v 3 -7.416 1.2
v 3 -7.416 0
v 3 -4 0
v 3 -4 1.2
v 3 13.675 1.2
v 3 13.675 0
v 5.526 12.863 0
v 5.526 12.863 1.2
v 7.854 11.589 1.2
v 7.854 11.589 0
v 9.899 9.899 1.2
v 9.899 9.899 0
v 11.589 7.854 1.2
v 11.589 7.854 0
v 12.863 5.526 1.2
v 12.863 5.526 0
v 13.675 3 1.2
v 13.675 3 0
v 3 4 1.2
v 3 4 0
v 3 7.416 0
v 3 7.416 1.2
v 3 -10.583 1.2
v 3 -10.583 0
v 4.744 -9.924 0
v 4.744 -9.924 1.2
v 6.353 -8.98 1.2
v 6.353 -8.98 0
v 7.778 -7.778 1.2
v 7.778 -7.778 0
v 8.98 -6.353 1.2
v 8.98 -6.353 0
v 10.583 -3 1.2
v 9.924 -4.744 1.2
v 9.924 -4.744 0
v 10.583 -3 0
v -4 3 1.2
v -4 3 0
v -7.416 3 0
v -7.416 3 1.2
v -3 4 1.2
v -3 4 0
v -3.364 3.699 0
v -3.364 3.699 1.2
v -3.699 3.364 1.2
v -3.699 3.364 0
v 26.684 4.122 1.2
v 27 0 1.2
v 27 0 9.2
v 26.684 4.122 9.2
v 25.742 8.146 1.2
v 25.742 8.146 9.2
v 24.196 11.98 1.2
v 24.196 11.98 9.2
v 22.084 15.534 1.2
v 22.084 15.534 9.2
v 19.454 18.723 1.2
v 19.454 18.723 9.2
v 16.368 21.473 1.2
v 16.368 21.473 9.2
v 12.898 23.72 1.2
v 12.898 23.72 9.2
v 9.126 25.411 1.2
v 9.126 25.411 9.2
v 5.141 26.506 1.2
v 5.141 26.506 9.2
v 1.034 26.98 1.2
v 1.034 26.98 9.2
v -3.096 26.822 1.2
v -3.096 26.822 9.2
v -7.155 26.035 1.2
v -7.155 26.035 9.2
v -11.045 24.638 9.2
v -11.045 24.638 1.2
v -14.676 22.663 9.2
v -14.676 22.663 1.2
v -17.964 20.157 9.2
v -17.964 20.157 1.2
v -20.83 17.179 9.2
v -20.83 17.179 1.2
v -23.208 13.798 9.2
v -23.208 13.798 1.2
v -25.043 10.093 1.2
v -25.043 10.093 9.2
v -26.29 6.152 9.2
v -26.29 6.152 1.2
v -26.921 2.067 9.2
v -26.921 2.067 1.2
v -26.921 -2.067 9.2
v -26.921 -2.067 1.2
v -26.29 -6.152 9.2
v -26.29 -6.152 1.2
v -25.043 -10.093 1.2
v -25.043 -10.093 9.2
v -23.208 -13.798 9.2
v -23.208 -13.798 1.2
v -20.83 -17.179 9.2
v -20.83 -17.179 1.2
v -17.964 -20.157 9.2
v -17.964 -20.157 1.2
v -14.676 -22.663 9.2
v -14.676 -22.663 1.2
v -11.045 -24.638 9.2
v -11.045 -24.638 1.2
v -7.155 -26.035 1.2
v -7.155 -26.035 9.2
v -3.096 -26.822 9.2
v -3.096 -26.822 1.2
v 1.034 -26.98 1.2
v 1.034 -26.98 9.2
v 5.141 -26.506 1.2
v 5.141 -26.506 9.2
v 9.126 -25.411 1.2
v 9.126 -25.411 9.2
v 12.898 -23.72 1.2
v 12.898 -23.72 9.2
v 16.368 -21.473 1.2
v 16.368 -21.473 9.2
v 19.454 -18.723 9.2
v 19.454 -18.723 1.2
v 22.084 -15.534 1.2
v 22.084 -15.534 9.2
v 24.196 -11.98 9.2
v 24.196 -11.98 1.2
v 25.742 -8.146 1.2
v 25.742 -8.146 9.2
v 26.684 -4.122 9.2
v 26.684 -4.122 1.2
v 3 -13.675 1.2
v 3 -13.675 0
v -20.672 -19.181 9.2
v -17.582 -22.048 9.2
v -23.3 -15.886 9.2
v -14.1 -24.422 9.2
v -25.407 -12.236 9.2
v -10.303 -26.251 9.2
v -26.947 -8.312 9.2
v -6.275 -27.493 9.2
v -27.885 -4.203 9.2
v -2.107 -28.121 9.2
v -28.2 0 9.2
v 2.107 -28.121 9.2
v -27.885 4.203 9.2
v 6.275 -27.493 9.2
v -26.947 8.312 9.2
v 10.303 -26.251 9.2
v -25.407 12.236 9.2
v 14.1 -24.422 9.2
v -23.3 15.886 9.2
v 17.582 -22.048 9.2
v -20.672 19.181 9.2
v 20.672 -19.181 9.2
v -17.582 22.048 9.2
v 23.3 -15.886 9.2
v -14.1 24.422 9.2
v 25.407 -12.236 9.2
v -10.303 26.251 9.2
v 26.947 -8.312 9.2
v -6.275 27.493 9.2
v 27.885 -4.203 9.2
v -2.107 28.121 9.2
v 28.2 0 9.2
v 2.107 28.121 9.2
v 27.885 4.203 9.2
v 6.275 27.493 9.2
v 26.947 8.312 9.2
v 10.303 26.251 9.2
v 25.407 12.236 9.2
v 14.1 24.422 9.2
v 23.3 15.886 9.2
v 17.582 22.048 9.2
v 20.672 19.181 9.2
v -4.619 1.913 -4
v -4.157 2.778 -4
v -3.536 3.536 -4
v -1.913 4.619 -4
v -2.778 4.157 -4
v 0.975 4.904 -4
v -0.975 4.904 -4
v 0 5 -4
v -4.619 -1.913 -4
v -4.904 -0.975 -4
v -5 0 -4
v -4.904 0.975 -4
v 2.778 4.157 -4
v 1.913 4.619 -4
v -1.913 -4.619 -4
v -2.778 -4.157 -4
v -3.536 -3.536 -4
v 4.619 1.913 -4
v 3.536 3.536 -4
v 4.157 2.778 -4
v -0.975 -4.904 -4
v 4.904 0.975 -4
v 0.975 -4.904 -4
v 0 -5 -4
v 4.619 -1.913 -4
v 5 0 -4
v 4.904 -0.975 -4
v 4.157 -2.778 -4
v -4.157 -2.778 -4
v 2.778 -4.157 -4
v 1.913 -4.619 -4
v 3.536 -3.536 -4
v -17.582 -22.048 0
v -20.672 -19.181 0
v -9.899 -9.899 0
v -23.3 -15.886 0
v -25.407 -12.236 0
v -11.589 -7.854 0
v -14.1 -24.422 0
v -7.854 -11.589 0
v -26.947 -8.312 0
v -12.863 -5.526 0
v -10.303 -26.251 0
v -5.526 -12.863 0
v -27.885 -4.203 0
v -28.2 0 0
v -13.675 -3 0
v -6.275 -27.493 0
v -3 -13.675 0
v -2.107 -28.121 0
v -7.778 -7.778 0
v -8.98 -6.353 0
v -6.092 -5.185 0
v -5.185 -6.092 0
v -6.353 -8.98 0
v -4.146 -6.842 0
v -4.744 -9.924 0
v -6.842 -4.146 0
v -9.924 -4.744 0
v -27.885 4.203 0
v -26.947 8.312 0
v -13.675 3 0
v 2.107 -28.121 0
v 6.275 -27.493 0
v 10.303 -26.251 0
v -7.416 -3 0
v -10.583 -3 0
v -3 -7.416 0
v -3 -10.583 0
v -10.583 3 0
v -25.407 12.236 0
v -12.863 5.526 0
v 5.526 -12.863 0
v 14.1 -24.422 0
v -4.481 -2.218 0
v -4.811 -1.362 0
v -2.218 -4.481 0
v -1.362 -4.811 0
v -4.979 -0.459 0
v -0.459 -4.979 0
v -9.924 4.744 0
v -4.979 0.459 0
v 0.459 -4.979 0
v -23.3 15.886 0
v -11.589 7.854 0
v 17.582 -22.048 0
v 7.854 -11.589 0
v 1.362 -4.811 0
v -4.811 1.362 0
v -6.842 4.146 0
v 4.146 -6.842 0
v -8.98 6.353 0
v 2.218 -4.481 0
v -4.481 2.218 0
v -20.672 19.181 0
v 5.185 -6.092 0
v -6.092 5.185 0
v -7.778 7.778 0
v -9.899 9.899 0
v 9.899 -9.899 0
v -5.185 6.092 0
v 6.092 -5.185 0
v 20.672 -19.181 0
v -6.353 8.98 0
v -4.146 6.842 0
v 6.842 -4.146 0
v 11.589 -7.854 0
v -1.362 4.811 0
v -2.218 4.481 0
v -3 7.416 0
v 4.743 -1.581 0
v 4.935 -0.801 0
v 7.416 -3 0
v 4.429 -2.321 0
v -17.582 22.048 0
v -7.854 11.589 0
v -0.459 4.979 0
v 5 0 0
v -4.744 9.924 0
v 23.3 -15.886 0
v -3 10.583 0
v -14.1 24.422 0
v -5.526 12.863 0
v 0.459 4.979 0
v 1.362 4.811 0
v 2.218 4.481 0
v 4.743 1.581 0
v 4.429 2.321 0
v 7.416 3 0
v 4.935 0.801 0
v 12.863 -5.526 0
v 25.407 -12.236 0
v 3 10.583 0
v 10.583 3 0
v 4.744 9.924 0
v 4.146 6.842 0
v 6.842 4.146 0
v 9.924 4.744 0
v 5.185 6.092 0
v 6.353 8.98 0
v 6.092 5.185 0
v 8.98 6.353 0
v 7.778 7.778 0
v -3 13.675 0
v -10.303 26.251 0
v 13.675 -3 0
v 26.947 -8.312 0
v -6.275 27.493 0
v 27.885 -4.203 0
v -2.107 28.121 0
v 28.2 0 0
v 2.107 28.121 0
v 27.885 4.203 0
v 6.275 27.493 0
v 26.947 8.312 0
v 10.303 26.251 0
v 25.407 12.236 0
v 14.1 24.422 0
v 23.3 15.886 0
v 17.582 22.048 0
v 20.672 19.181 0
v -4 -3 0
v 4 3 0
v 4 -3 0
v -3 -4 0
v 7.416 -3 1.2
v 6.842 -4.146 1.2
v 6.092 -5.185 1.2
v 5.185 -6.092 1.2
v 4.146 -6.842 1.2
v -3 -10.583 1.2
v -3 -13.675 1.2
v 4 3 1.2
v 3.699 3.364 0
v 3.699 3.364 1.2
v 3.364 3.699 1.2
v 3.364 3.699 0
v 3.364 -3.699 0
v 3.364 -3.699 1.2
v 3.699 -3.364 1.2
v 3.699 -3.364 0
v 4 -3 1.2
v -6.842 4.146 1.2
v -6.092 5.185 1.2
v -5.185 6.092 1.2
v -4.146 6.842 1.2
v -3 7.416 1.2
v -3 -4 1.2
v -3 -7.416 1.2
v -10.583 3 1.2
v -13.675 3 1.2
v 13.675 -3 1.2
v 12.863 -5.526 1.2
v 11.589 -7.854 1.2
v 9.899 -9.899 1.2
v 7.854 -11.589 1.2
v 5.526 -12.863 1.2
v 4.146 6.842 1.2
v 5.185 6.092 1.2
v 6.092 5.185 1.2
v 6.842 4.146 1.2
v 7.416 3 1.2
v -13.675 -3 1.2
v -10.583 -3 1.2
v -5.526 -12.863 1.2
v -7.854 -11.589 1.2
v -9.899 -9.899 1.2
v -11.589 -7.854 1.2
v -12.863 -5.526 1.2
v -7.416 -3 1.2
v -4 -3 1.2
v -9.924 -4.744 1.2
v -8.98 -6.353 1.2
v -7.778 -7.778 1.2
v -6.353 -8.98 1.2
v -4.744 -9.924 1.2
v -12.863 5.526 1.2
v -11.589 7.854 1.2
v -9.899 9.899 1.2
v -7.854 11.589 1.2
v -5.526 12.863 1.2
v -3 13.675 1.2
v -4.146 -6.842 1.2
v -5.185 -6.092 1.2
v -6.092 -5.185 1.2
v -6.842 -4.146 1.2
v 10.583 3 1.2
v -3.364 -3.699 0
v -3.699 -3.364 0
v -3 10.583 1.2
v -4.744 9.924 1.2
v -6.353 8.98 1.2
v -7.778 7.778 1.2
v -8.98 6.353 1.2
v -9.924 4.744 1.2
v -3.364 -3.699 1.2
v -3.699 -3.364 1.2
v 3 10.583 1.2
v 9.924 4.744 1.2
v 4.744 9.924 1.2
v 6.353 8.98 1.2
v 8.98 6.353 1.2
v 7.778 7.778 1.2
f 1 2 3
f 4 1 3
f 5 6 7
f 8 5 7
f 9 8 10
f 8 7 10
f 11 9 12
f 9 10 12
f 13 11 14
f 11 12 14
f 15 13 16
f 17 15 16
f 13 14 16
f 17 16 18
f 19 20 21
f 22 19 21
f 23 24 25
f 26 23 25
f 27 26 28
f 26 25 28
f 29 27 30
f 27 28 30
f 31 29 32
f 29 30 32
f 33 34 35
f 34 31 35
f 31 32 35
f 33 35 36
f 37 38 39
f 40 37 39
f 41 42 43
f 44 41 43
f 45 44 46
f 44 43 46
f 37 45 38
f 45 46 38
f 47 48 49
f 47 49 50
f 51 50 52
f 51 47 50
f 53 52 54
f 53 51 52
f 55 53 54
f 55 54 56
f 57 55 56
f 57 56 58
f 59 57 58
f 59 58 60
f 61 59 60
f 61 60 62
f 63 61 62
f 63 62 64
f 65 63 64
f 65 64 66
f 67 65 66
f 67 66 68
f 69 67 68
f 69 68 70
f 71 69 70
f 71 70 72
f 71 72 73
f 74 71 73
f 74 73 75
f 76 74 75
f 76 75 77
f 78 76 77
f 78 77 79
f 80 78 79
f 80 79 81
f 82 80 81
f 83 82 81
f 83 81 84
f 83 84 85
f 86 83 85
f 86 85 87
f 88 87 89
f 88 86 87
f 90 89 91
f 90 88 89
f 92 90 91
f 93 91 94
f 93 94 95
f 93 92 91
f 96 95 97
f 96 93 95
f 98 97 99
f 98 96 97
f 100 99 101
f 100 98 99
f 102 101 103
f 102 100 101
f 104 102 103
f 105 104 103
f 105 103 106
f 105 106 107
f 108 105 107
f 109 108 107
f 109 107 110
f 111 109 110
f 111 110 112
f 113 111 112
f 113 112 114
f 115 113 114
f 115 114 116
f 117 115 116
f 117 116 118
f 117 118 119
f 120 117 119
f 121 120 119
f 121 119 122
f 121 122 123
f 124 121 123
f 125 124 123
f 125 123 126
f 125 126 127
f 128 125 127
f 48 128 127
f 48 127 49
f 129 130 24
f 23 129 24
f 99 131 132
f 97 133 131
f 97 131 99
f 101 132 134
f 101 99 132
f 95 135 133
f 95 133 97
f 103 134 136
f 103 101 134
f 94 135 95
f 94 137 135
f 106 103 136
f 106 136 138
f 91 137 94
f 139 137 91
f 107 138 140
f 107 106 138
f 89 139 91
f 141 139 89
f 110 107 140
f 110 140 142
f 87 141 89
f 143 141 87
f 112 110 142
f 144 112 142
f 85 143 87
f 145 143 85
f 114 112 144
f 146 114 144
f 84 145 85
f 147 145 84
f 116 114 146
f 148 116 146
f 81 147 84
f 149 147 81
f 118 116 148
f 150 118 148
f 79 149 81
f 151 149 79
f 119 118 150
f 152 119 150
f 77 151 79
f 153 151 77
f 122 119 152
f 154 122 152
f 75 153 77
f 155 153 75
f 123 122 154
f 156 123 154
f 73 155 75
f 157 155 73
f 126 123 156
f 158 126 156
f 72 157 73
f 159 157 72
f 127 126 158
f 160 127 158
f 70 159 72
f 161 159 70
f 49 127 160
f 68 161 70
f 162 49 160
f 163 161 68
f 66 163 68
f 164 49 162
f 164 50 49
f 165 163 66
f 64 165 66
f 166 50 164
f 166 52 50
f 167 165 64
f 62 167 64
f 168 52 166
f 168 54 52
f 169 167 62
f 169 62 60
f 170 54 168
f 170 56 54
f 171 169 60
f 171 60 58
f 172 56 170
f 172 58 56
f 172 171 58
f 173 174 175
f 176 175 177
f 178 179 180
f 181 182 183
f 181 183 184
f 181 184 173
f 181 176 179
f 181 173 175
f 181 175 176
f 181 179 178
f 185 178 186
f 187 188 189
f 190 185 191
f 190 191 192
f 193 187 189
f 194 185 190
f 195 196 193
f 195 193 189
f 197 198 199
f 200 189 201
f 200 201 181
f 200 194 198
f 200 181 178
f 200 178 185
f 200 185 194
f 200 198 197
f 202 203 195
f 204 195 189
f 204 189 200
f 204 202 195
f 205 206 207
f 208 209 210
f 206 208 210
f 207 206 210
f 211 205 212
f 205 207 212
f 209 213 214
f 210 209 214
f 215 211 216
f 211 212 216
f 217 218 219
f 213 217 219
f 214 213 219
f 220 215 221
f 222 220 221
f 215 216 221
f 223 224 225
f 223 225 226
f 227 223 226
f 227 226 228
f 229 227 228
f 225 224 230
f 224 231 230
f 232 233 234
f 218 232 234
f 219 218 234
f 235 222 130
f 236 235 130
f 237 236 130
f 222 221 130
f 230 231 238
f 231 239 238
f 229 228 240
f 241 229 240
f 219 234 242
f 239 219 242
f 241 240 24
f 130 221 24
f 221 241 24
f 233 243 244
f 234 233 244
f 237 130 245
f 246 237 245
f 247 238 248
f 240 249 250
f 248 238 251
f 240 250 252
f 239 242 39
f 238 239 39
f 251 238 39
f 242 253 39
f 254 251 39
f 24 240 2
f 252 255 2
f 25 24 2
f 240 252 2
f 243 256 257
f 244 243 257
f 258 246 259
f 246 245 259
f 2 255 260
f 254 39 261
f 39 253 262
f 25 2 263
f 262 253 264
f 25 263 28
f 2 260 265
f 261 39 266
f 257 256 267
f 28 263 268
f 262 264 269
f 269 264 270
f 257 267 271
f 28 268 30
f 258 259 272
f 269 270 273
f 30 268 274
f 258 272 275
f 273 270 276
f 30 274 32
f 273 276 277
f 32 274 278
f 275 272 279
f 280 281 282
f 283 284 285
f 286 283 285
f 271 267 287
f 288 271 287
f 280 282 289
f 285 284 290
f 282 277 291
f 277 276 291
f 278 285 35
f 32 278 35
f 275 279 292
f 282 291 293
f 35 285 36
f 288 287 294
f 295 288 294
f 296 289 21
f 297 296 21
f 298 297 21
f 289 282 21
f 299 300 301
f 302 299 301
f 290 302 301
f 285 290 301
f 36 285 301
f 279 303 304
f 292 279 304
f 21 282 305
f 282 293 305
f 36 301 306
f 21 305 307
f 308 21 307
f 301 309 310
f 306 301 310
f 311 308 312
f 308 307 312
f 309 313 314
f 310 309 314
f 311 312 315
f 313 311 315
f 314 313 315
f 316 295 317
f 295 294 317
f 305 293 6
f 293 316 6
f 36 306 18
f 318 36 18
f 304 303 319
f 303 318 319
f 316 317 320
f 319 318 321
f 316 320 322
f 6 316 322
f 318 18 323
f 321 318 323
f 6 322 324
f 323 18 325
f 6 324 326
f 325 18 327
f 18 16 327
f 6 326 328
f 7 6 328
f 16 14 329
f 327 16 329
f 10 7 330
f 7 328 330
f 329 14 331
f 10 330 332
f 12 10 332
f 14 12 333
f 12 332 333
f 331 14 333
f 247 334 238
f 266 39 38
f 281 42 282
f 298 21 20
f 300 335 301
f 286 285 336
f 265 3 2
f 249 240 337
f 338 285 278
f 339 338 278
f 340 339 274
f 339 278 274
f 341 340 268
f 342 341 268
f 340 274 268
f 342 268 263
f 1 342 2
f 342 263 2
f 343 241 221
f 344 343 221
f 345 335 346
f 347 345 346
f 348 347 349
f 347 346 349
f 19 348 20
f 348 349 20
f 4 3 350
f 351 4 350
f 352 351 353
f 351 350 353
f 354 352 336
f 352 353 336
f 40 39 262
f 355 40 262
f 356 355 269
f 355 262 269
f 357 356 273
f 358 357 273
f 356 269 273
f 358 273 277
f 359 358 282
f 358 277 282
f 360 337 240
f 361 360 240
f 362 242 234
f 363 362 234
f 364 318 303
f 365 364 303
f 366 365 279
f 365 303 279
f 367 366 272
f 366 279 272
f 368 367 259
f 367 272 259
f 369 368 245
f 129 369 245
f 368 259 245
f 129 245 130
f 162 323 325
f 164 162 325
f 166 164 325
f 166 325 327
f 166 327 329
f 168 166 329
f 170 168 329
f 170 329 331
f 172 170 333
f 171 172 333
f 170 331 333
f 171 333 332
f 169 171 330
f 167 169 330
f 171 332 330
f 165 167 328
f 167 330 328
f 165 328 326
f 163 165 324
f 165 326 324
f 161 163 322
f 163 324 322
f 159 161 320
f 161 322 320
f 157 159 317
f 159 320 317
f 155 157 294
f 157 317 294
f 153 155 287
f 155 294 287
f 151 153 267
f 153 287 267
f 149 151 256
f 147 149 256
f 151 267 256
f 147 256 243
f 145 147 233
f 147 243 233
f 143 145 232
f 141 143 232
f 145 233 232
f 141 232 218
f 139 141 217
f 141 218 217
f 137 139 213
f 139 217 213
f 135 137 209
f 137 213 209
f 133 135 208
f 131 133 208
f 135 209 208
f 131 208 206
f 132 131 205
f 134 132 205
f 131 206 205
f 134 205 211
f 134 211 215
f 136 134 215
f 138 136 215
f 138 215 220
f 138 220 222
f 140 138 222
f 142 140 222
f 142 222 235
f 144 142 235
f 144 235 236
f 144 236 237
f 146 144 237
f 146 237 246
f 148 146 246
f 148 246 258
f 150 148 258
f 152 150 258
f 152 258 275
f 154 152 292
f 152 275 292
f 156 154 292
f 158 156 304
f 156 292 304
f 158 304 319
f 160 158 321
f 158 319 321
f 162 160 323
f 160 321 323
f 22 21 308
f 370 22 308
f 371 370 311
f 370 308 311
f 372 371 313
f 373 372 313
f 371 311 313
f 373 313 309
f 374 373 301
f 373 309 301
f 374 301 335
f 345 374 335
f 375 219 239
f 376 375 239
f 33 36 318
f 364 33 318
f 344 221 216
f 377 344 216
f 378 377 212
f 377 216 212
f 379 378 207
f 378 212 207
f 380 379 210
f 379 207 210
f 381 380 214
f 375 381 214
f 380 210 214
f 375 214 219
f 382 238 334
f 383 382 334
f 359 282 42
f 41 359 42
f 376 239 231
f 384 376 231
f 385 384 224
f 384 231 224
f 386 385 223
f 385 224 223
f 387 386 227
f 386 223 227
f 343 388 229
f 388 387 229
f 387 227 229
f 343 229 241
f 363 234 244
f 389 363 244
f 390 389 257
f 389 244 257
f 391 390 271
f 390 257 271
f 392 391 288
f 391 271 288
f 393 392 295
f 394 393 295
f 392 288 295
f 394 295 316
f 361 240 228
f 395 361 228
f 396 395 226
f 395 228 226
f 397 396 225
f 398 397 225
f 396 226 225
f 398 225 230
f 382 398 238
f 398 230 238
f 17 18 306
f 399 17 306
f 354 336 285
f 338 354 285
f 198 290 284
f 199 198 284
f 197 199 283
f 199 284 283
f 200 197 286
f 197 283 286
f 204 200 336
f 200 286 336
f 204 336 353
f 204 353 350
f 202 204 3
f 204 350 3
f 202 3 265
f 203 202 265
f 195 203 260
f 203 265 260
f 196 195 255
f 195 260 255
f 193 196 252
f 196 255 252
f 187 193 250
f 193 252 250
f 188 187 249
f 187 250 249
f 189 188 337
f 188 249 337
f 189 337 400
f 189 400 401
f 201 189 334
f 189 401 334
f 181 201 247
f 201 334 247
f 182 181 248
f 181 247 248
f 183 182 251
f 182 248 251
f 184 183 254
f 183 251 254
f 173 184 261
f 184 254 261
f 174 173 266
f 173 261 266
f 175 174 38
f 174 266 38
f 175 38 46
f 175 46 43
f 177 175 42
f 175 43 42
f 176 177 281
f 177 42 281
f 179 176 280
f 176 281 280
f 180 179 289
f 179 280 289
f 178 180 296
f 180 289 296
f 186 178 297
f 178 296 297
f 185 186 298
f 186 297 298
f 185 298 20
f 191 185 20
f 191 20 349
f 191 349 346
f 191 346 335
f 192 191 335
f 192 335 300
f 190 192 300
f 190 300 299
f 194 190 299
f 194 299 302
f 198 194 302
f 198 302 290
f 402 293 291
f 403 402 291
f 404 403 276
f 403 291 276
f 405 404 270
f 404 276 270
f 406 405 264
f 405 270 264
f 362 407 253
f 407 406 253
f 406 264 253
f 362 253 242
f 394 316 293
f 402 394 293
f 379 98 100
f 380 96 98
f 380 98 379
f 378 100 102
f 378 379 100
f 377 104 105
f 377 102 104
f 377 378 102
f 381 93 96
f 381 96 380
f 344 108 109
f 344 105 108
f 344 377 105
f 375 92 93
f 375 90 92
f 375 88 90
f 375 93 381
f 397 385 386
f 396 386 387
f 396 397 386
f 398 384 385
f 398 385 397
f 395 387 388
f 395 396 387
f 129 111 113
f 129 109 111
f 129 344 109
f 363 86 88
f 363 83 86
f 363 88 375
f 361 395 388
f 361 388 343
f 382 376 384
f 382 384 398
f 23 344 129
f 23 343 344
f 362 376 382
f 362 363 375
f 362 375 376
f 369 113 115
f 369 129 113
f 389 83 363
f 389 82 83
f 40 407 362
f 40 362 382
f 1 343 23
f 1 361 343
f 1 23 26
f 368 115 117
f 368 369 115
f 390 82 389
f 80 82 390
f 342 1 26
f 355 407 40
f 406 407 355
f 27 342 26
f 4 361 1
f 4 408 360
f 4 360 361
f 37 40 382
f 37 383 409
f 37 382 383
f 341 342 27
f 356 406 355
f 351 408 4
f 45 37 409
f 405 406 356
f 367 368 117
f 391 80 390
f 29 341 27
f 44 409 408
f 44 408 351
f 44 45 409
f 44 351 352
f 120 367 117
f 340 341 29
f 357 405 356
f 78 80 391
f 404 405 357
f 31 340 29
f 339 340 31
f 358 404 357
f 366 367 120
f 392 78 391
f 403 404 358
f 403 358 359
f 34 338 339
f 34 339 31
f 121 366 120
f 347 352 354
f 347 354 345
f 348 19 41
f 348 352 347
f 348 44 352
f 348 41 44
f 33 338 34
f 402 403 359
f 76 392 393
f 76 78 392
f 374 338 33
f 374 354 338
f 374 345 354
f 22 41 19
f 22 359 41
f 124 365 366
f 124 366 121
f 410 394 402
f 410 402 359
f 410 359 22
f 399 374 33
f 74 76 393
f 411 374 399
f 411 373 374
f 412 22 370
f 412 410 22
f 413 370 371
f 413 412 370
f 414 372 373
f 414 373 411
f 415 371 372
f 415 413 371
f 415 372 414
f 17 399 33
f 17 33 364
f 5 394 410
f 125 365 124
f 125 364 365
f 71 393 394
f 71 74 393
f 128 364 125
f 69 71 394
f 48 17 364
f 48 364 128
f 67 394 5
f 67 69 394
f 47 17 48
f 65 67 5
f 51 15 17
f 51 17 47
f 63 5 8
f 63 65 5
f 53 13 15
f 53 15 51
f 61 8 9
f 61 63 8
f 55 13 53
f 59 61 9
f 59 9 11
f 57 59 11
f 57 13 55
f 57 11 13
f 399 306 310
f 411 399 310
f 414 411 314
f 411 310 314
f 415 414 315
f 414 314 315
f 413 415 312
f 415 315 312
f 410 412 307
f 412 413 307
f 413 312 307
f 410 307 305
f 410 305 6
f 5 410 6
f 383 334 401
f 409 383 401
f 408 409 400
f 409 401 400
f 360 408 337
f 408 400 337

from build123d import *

# Parameters (mm, degrees)
F0_R     = 28.2
F1_DEPTH = 9.2
F2_T     = -1.2
F4_DEPTH = 9.201
F5_R     = 5
F6_DEPTH = 4


# Not quite as in the source:
# - after a boolean that leaves OpenCascade's solid faulty, fix() repairs it


with BuildPart() as f1:
    # F0 (on Top) → F1 (new body)
    with BuildSketch(Plane.XY):
        Circle(F0_R)
    extrude(amount=F1_DEPTH)

    # F2
    f2_openings = [f1.faces().sort_by_distance(p)[0] for p in [
        (0, 0, 9.2),
    ]]
    offset(amount=F2_T, openings=f2_openings)

    # F3 (on face) → F4 (cut, through all)
    with BuildSketch(Plane(origin=(0, 0, 0), x_dir=(1, 0, 0), z_dir=(0, 0, -1))):
        with BuildLine():
            ThreePointArc((4, -3), (3.5355339059, -3.5355339059), (3, -4))
            Line((3, -4), (3, -7.4161984871))
            ThreePointArc((3, -7.4161984871), (5.6568542495, -5.6568542495), (7.4161984871, -3))
            Line((7.4161984871, -3), (4, -3))
        make_face()
        with BuildLine():
            ThreePointArc((10.5830052443, -3), (7.7781745931, -7.7781745931), (3, -10.5830052443))
            Line((3, -10.5830052443), (3, -13.6747943312))
            ThreePointArc((3, -13.6747943312), (9.8994949366, -9.8994949366), (13.6747943312, -3))
            Line((13.6747943312, -3), (10.5830052443, -3))
        make_face()
        with BuildLine():
            ThreePointArc((-13.6747943312, -3), (-9.8994949366, -9.8994949366), (-3, -13.6747943312))
            Line((-3, -13.6747943312), (-3, -10.5830052443))
            ThreePointArc((-3, -10.5830052443), (-7.7781745931, -7.7781745931), (-10.5830052443, -3))
            Line((-10.5830052443, -3), (-13.6747943312, -3))
        make_face()
        with BuildLine():
            ThreePointArc((-4, 3), (-3.5355339059, 3.5355339059), (-3, 4))
            Line((-3, 4), (-3, 7.4161984871))
            ThreePointArc((-3, 7.4161984871), (-5.6568542495, 5.6568542495), (-7.4161984871, 3))
            Line((-7.4161984871, 3), (-4, 3))
        make_face()
        with BuildLine():
            ThreePointArc((-10.5830052443, 3), (-7.7781745931, 7.7781745931), (-3, 10.5830052443))
            Line((-3, 10.5830052443), (-3, 13.6747943312))
            ThreePointArc((-3, 13.6747943312), (-9.8994949366, 9.8994949366), (-13.6747943312, 3))
            Line((-13.6747943312, 3), (-10.5830052443, 3))
        make_face()
        with BuildLine():
            Line((10.5830052443, 3), (13.6747943312, 3))
            ThreePointArc((13.6747943312, 3), (9.8994949366, 9.8994949366), (3, 13.6747943312))
            Line((3, 13.6747943312), (3, 10.5830052443))
            ThreePointArc((3, 10.5830052443), (7.7781745931, 7.7781745931), (10.5830052443, 3))
        make_face()
        with BuildLine():
            Line((4, 3), (7.4161984871, 3))
            ThreePointArc((7.4161984871, 3), (5.6568542495, 5.6568542495), (3, 7.4161984871))
            Line((3, 7.4161984871), (3, 4))
            ThreePointArc((3, 4), (3.5355339059, 3.5355339059), (4, 3))
        make_face()
        with BuildLine():
            Line((-4, -3), (-7.4161984871, -3))
            ThreePointArc((-7.4161984871, -3), (-5.6568542495, -5.6568542495), (-3, -7.4161984871))
            Line((-3, -7.4161984871), (-3, -4))
            ThreePointArc((-3, -4), (-3.5355339059, -3.5355339059), (-4, -3))
        make_face()
    extrude(amount=-F4_DEPTH, mode=Mode.SUBTRACT)

    # F5 (on face) → F6 (join)
    with BuildSketch(Plane(origin=(0, 0, 0), x_dir=(1, 0, 0), z_dir=(0, 0, -1))):
        Circle(F5_R)
    extrude(amount=F6_DEPTH)

    add(f1.part.fix(), mode=Mode.REPLACE)


solid = f1.part
